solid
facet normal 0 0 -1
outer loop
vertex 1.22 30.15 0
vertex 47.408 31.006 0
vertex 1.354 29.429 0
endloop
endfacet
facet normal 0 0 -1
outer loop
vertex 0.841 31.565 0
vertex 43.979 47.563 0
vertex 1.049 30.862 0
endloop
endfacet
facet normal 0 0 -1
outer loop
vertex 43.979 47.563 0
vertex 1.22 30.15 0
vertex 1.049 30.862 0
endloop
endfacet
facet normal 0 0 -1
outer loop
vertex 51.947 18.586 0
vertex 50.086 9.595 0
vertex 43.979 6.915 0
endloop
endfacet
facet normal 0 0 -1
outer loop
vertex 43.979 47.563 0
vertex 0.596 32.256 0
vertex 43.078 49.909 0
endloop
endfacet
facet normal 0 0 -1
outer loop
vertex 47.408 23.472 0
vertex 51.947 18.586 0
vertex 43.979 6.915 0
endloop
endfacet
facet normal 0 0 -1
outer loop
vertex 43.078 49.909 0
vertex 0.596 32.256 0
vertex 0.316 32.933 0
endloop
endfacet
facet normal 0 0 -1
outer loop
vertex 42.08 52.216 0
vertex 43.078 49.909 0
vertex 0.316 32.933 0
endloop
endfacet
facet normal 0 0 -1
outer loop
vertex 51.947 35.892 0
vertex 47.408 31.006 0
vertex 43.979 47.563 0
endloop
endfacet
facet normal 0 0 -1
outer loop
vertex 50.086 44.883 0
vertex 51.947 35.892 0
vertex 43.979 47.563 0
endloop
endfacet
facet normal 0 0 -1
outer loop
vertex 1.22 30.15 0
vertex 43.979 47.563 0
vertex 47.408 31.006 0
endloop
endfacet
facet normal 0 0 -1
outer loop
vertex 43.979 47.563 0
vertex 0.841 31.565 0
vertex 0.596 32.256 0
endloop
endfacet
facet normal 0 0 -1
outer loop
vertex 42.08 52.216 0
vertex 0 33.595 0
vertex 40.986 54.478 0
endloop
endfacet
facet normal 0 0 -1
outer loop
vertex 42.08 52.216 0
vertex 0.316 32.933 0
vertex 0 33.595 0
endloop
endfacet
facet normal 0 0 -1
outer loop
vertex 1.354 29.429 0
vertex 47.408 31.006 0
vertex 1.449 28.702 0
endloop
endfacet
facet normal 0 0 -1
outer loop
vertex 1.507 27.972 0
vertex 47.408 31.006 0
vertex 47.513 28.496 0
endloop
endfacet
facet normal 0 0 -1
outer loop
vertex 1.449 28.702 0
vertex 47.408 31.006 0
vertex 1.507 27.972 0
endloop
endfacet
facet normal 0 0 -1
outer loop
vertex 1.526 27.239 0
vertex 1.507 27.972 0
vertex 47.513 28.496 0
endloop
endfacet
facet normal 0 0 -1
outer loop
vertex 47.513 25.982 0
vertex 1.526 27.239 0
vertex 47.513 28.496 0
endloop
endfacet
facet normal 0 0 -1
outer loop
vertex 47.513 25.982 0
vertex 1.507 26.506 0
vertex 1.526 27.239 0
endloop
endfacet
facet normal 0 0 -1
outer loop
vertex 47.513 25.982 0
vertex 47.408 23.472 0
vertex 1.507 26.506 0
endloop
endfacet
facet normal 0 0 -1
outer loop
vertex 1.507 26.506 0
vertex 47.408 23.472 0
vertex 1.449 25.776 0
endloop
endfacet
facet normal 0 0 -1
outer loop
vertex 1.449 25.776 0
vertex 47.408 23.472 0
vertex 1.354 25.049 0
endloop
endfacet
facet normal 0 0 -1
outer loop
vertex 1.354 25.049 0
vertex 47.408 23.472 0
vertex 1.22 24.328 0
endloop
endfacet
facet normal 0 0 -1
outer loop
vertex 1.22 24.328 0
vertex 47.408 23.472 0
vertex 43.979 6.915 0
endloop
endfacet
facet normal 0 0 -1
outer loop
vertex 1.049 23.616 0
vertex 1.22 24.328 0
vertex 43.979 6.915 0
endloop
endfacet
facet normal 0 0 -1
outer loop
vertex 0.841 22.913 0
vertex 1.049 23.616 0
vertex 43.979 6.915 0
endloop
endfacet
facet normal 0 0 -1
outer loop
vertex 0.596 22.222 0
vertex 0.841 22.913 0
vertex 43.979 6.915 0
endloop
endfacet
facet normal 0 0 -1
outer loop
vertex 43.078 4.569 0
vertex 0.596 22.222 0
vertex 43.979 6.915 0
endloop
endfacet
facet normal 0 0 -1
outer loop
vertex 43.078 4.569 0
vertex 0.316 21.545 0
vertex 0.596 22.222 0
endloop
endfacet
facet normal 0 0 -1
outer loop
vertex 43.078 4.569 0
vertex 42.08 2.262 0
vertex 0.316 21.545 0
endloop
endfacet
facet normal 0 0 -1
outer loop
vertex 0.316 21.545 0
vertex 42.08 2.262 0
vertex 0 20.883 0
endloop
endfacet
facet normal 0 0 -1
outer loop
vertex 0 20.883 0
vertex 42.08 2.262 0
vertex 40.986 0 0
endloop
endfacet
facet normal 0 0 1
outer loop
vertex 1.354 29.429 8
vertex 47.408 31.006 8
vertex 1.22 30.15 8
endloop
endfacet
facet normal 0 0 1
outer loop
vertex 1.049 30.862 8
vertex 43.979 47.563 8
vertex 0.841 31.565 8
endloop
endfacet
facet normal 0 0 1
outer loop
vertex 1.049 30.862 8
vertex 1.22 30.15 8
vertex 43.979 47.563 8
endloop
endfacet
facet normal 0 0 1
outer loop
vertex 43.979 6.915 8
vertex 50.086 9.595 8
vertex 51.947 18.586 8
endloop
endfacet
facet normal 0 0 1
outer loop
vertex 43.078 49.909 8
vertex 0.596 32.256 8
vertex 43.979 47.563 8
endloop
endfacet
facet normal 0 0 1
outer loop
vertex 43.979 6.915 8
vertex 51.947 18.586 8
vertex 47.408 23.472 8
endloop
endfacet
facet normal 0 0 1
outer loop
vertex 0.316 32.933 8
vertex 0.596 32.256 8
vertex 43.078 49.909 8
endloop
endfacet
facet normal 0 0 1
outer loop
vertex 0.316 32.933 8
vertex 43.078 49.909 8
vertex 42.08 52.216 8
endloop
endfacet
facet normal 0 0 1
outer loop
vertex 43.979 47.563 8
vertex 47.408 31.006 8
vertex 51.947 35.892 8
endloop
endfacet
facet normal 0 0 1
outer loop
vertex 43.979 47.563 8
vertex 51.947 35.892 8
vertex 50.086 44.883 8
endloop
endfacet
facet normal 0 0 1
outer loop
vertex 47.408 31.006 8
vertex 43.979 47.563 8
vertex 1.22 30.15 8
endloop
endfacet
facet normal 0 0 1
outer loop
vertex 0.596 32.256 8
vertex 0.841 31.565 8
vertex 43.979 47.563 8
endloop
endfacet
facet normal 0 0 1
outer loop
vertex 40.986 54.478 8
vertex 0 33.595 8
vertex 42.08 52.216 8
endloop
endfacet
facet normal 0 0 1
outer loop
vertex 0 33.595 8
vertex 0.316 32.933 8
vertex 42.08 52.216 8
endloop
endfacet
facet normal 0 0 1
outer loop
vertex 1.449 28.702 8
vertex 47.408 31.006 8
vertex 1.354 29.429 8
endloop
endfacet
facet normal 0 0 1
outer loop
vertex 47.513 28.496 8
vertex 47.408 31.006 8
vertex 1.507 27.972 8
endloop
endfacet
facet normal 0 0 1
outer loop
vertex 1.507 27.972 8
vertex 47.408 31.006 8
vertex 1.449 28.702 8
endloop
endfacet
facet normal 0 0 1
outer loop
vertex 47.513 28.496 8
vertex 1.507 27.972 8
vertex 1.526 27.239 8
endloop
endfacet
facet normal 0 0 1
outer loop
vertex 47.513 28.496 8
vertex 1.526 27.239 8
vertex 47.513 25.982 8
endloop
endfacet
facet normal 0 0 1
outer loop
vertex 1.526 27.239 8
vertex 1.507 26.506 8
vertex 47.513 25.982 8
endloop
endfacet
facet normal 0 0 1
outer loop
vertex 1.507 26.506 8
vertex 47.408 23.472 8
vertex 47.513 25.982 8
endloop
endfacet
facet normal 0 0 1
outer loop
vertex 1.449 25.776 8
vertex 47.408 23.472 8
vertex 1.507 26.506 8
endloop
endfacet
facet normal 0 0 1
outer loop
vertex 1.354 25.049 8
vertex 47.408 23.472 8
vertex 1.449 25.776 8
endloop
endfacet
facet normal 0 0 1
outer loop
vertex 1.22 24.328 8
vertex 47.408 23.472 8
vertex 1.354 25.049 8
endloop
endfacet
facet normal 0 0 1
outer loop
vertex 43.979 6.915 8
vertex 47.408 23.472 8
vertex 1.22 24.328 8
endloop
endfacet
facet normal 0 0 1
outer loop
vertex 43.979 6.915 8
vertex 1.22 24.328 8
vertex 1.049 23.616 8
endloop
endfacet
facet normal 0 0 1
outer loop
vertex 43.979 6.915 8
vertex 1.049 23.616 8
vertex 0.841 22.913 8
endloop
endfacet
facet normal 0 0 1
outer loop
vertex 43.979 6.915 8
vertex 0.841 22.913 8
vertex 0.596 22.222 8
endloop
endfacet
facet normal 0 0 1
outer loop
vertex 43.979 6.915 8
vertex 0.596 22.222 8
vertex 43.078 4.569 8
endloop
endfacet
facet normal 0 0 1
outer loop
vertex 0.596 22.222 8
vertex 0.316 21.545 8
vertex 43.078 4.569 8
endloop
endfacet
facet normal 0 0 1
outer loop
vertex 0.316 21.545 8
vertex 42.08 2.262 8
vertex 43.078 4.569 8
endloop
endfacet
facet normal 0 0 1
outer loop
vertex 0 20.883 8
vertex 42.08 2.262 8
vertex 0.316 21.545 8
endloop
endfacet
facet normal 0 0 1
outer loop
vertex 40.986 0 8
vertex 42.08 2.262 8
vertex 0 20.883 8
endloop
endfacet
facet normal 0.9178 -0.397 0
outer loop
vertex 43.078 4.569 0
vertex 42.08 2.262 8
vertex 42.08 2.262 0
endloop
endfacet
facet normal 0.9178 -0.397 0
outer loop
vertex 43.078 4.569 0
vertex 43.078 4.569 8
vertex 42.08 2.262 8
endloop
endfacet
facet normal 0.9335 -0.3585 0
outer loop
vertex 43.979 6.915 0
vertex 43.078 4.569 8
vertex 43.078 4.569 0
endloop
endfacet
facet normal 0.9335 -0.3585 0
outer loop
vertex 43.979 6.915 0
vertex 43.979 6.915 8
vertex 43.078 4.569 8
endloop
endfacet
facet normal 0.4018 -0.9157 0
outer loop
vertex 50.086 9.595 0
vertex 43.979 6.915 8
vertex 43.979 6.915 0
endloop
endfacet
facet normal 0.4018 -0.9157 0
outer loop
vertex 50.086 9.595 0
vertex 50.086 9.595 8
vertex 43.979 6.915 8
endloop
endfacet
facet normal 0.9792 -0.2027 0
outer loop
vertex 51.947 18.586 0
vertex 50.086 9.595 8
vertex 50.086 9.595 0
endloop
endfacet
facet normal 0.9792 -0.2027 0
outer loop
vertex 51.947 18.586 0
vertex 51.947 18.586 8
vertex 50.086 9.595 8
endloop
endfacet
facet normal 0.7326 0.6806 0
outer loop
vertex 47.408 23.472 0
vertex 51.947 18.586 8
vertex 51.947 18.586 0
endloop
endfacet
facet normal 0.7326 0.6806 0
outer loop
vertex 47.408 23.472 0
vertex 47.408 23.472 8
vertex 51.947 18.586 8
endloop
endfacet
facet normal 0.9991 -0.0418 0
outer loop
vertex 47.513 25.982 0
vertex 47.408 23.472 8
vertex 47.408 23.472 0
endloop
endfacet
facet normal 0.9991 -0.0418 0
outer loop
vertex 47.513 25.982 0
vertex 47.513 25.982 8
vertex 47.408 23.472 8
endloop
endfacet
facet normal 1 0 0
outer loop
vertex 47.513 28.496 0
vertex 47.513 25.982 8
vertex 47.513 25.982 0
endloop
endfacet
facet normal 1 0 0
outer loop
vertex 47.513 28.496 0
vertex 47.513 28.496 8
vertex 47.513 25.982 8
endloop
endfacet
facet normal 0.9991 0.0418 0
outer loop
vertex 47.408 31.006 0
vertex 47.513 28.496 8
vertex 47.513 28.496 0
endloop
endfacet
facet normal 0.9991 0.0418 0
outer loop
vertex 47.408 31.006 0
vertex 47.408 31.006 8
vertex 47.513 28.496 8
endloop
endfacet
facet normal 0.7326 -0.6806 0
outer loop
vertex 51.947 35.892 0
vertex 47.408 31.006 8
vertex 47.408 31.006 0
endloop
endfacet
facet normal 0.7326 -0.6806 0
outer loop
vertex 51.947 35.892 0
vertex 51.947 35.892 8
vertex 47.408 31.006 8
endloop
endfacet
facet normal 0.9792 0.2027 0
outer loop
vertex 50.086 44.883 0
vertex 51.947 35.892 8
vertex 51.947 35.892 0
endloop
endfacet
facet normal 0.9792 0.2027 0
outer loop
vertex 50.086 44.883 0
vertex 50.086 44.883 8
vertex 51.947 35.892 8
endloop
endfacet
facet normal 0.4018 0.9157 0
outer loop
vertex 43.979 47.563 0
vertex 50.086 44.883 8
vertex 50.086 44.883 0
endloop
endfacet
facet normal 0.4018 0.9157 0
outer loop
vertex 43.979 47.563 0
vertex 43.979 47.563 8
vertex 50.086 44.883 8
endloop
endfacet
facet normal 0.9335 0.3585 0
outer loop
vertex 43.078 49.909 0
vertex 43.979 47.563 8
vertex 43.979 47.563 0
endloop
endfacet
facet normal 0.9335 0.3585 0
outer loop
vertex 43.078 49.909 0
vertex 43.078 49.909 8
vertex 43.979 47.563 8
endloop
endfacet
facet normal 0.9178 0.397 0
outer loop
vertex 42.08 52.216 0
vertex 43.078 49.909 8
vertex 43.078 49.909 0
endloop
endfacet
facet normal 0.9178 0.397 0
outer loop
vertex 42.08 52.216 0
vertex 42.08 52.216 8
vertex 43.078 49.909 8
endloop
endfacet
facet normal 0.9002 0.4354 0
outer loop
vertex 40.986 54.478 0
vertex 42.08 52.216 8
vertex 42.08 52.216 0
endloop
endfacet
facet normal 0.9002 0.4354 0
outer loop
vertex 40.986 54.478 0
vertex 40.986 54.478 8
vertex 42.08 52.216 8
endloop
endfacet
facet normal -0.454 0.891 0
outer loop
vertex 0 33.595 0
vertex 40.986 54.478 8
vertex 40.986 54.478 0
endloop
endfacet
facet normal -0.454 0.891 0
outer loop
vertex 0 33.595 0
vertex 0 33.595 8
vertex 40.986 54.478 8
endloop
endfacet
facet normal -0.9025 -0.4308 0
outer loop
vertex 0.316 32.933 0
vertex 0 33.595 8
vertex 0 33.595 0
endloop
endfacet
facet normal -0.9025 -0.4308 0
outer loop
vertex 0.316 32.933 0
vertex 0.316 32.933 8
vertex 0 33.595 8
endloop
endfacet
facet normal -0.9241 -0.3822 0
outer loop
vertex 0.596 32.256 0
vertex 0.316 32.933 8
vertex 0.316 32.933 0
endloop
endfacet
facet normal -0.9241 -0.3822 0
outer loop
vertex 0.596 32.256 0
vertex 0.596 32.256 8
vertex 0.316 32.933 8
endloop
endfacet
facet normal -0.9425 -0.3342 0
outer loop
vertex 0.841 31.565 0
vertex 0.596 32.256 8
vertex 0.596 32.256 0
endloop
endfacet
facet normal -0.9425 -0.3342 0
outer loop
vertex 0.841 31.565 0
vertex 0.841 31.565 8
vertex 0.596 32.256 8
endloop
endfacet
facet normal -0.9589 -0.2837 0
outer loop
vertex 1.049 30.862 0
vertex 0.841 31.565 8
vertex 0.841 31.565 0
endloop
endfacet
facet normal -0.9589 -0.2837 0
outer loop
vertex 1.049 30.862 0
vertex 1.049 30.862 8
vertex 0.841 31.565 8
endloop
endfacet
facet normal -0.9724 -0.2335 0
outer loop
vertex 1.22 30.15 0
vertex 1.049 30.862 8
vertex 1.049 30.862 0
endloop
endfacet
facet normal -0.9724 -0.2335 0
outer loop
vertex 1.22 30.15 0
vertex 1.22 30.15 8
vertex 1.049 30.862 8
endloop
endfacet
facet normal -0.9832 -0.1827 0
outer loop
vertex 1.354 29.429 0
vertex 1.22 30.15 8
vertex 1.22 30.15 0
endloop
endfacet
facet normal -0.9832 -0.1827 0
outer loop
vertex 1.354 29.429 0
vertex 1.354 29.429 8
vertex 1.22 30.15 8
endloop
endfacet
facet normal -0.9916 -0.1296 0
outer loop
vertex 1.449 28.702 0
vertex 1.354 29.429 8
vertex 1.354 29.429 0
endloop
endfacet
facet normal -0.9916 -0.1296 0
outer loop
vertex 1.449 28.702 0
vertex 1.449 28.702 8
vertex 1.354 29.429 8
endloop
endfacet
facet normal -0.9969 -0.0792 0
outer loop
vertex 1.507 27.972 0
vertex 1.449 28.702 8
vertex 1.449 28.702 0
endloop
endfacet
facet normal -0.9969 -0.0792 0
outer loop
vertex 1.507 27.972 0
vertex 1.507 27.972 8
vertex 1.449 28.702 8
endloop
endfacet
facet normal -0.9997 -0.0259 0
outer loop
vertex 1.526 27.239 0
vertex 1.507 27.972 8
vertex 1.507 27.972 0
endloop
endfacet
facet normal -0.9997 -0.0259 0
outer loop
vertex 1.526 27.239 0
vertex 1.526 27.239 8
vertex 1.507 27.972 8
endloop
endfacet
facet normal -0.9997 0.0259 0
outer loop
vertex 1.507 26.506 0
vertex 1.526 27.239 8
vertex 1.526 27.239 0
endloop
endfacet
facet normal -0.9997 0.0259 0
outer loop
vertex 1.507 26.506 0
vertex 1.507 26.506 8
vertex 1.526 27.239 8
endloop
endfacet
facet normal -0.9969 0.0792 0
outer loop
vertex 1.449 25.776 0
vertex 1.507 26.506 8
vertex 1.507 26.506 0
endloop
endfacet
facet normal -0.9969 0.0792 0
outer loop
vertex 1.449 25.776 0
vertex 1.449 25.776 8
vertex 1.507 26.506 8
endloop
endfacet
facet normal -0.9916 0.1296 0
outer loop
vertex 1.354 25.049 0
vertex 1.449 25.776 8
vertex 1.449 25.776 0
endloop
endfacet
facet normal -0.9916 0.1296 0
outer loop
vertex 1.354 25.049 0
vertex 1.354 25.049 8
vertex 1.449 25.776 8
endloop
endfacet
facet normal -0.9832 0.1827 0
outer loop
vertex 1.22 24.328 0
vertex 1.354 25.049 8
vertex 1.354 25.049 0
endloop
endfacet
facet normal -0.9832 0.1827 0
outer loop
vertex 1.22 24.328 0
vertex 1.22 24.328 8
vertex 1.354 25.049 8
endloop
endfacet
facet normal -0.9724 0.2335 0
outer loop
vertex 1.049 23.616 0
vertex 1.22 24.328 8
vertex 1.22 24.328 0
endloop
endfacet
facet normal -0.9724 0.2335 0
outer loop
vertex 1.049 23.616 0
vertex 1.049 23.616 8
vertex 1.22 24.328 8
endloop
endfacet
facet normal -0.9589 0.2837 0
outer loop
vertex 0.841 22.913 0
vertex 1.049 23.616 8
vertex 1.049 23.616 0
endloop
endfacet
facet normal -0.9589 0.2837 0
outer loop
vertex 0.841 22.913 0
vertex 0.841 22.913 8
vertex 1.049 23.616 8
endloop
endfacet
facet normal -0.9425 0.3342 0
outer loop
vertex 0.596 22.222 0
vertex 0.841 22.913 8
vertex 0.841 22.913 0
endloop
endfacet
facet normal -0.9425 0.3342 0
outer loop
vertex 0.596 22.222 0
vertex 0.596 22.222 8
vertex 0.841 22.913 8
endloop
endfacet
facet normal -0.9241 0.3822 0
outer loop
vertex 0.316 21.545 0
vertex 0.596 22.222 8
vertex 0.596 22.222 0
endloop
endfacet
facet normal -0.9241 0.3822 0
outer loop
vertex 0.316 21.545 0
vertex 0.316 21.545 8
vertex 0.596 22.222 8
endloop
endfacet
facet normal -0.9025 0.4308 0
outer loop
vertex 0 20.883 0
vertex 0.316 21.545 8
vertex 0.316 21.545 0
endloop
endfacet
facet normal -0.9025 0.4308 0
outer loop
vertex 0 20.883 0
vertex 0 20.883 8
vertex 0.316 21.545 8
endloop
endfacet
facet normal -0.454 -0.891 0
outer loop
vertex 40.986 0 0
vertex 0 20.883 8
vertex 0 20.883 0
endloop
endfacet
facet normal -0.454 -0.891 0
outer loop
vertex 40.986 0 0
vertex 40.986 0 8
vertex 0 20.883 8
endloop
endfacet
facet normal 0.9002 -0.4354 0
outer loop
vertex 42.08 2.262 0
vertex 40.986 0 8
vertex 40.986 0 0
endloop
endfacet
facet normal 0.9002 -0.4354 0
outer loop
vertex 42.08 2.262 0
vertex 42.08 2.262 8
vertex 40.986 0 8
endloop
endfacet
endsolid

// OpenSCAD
$fn = 32;

// ----------------------------------------------------------------------
// Gear sector: 2 teeth on 54 degrees
// ----------------------------------------------------------------------

// --- parameters (mm) ---
sector_angle = 54;        // sector angle, degrees
root_r = 60;              // root circle radius
tooth_h = 5;              // tooth height over the root circle
teeth = 2;                // number of teeth on the sector
hub_r = 14;               // hub bore radius
plate_t = 8;              // sector thickness, Z
arc_step = 3;             // sampling step of the root/hub arcs, degrees

tip_r = root_r + tooth_h;  // tip circle radius

profile = [[40.986, 0], [42.08, 2.262], [43.078, 4.569], [43.979, 6.915], [50.086, 9.595], [51.947, 18.586], [47.408, 23.472], [47.513, 25.982], [47.513, 28.496], [47.408, 31.006], [51.947, 35.892], [50.086, 44.883], [43.979, 47.563], [43.078, 49.909], [42.08, 52.216], [40.986, 54.478], [0, 33.595], [0.316, 32.933], [0.596, 32.256], [0.841, 31.565], [1.049, 30.862], [1.22, 30.15], [1.354, 29.429], [1.449, 28.702], [1.507, 27.972], [1.526, 27.239], [1.507, 26.506], [1.449, 25.776], [1.354, 25.049], [1.22, 24.328], [1.049, 23.616], [0.841, 22.913], [0.596, 22.222], [0.316, 21.545], [0, 20.883]];  // primary outline, 35 points, counter clockwise

// --- the one profile operation ---
linear_extrude(height = plate_t) polygon(points = profile);
